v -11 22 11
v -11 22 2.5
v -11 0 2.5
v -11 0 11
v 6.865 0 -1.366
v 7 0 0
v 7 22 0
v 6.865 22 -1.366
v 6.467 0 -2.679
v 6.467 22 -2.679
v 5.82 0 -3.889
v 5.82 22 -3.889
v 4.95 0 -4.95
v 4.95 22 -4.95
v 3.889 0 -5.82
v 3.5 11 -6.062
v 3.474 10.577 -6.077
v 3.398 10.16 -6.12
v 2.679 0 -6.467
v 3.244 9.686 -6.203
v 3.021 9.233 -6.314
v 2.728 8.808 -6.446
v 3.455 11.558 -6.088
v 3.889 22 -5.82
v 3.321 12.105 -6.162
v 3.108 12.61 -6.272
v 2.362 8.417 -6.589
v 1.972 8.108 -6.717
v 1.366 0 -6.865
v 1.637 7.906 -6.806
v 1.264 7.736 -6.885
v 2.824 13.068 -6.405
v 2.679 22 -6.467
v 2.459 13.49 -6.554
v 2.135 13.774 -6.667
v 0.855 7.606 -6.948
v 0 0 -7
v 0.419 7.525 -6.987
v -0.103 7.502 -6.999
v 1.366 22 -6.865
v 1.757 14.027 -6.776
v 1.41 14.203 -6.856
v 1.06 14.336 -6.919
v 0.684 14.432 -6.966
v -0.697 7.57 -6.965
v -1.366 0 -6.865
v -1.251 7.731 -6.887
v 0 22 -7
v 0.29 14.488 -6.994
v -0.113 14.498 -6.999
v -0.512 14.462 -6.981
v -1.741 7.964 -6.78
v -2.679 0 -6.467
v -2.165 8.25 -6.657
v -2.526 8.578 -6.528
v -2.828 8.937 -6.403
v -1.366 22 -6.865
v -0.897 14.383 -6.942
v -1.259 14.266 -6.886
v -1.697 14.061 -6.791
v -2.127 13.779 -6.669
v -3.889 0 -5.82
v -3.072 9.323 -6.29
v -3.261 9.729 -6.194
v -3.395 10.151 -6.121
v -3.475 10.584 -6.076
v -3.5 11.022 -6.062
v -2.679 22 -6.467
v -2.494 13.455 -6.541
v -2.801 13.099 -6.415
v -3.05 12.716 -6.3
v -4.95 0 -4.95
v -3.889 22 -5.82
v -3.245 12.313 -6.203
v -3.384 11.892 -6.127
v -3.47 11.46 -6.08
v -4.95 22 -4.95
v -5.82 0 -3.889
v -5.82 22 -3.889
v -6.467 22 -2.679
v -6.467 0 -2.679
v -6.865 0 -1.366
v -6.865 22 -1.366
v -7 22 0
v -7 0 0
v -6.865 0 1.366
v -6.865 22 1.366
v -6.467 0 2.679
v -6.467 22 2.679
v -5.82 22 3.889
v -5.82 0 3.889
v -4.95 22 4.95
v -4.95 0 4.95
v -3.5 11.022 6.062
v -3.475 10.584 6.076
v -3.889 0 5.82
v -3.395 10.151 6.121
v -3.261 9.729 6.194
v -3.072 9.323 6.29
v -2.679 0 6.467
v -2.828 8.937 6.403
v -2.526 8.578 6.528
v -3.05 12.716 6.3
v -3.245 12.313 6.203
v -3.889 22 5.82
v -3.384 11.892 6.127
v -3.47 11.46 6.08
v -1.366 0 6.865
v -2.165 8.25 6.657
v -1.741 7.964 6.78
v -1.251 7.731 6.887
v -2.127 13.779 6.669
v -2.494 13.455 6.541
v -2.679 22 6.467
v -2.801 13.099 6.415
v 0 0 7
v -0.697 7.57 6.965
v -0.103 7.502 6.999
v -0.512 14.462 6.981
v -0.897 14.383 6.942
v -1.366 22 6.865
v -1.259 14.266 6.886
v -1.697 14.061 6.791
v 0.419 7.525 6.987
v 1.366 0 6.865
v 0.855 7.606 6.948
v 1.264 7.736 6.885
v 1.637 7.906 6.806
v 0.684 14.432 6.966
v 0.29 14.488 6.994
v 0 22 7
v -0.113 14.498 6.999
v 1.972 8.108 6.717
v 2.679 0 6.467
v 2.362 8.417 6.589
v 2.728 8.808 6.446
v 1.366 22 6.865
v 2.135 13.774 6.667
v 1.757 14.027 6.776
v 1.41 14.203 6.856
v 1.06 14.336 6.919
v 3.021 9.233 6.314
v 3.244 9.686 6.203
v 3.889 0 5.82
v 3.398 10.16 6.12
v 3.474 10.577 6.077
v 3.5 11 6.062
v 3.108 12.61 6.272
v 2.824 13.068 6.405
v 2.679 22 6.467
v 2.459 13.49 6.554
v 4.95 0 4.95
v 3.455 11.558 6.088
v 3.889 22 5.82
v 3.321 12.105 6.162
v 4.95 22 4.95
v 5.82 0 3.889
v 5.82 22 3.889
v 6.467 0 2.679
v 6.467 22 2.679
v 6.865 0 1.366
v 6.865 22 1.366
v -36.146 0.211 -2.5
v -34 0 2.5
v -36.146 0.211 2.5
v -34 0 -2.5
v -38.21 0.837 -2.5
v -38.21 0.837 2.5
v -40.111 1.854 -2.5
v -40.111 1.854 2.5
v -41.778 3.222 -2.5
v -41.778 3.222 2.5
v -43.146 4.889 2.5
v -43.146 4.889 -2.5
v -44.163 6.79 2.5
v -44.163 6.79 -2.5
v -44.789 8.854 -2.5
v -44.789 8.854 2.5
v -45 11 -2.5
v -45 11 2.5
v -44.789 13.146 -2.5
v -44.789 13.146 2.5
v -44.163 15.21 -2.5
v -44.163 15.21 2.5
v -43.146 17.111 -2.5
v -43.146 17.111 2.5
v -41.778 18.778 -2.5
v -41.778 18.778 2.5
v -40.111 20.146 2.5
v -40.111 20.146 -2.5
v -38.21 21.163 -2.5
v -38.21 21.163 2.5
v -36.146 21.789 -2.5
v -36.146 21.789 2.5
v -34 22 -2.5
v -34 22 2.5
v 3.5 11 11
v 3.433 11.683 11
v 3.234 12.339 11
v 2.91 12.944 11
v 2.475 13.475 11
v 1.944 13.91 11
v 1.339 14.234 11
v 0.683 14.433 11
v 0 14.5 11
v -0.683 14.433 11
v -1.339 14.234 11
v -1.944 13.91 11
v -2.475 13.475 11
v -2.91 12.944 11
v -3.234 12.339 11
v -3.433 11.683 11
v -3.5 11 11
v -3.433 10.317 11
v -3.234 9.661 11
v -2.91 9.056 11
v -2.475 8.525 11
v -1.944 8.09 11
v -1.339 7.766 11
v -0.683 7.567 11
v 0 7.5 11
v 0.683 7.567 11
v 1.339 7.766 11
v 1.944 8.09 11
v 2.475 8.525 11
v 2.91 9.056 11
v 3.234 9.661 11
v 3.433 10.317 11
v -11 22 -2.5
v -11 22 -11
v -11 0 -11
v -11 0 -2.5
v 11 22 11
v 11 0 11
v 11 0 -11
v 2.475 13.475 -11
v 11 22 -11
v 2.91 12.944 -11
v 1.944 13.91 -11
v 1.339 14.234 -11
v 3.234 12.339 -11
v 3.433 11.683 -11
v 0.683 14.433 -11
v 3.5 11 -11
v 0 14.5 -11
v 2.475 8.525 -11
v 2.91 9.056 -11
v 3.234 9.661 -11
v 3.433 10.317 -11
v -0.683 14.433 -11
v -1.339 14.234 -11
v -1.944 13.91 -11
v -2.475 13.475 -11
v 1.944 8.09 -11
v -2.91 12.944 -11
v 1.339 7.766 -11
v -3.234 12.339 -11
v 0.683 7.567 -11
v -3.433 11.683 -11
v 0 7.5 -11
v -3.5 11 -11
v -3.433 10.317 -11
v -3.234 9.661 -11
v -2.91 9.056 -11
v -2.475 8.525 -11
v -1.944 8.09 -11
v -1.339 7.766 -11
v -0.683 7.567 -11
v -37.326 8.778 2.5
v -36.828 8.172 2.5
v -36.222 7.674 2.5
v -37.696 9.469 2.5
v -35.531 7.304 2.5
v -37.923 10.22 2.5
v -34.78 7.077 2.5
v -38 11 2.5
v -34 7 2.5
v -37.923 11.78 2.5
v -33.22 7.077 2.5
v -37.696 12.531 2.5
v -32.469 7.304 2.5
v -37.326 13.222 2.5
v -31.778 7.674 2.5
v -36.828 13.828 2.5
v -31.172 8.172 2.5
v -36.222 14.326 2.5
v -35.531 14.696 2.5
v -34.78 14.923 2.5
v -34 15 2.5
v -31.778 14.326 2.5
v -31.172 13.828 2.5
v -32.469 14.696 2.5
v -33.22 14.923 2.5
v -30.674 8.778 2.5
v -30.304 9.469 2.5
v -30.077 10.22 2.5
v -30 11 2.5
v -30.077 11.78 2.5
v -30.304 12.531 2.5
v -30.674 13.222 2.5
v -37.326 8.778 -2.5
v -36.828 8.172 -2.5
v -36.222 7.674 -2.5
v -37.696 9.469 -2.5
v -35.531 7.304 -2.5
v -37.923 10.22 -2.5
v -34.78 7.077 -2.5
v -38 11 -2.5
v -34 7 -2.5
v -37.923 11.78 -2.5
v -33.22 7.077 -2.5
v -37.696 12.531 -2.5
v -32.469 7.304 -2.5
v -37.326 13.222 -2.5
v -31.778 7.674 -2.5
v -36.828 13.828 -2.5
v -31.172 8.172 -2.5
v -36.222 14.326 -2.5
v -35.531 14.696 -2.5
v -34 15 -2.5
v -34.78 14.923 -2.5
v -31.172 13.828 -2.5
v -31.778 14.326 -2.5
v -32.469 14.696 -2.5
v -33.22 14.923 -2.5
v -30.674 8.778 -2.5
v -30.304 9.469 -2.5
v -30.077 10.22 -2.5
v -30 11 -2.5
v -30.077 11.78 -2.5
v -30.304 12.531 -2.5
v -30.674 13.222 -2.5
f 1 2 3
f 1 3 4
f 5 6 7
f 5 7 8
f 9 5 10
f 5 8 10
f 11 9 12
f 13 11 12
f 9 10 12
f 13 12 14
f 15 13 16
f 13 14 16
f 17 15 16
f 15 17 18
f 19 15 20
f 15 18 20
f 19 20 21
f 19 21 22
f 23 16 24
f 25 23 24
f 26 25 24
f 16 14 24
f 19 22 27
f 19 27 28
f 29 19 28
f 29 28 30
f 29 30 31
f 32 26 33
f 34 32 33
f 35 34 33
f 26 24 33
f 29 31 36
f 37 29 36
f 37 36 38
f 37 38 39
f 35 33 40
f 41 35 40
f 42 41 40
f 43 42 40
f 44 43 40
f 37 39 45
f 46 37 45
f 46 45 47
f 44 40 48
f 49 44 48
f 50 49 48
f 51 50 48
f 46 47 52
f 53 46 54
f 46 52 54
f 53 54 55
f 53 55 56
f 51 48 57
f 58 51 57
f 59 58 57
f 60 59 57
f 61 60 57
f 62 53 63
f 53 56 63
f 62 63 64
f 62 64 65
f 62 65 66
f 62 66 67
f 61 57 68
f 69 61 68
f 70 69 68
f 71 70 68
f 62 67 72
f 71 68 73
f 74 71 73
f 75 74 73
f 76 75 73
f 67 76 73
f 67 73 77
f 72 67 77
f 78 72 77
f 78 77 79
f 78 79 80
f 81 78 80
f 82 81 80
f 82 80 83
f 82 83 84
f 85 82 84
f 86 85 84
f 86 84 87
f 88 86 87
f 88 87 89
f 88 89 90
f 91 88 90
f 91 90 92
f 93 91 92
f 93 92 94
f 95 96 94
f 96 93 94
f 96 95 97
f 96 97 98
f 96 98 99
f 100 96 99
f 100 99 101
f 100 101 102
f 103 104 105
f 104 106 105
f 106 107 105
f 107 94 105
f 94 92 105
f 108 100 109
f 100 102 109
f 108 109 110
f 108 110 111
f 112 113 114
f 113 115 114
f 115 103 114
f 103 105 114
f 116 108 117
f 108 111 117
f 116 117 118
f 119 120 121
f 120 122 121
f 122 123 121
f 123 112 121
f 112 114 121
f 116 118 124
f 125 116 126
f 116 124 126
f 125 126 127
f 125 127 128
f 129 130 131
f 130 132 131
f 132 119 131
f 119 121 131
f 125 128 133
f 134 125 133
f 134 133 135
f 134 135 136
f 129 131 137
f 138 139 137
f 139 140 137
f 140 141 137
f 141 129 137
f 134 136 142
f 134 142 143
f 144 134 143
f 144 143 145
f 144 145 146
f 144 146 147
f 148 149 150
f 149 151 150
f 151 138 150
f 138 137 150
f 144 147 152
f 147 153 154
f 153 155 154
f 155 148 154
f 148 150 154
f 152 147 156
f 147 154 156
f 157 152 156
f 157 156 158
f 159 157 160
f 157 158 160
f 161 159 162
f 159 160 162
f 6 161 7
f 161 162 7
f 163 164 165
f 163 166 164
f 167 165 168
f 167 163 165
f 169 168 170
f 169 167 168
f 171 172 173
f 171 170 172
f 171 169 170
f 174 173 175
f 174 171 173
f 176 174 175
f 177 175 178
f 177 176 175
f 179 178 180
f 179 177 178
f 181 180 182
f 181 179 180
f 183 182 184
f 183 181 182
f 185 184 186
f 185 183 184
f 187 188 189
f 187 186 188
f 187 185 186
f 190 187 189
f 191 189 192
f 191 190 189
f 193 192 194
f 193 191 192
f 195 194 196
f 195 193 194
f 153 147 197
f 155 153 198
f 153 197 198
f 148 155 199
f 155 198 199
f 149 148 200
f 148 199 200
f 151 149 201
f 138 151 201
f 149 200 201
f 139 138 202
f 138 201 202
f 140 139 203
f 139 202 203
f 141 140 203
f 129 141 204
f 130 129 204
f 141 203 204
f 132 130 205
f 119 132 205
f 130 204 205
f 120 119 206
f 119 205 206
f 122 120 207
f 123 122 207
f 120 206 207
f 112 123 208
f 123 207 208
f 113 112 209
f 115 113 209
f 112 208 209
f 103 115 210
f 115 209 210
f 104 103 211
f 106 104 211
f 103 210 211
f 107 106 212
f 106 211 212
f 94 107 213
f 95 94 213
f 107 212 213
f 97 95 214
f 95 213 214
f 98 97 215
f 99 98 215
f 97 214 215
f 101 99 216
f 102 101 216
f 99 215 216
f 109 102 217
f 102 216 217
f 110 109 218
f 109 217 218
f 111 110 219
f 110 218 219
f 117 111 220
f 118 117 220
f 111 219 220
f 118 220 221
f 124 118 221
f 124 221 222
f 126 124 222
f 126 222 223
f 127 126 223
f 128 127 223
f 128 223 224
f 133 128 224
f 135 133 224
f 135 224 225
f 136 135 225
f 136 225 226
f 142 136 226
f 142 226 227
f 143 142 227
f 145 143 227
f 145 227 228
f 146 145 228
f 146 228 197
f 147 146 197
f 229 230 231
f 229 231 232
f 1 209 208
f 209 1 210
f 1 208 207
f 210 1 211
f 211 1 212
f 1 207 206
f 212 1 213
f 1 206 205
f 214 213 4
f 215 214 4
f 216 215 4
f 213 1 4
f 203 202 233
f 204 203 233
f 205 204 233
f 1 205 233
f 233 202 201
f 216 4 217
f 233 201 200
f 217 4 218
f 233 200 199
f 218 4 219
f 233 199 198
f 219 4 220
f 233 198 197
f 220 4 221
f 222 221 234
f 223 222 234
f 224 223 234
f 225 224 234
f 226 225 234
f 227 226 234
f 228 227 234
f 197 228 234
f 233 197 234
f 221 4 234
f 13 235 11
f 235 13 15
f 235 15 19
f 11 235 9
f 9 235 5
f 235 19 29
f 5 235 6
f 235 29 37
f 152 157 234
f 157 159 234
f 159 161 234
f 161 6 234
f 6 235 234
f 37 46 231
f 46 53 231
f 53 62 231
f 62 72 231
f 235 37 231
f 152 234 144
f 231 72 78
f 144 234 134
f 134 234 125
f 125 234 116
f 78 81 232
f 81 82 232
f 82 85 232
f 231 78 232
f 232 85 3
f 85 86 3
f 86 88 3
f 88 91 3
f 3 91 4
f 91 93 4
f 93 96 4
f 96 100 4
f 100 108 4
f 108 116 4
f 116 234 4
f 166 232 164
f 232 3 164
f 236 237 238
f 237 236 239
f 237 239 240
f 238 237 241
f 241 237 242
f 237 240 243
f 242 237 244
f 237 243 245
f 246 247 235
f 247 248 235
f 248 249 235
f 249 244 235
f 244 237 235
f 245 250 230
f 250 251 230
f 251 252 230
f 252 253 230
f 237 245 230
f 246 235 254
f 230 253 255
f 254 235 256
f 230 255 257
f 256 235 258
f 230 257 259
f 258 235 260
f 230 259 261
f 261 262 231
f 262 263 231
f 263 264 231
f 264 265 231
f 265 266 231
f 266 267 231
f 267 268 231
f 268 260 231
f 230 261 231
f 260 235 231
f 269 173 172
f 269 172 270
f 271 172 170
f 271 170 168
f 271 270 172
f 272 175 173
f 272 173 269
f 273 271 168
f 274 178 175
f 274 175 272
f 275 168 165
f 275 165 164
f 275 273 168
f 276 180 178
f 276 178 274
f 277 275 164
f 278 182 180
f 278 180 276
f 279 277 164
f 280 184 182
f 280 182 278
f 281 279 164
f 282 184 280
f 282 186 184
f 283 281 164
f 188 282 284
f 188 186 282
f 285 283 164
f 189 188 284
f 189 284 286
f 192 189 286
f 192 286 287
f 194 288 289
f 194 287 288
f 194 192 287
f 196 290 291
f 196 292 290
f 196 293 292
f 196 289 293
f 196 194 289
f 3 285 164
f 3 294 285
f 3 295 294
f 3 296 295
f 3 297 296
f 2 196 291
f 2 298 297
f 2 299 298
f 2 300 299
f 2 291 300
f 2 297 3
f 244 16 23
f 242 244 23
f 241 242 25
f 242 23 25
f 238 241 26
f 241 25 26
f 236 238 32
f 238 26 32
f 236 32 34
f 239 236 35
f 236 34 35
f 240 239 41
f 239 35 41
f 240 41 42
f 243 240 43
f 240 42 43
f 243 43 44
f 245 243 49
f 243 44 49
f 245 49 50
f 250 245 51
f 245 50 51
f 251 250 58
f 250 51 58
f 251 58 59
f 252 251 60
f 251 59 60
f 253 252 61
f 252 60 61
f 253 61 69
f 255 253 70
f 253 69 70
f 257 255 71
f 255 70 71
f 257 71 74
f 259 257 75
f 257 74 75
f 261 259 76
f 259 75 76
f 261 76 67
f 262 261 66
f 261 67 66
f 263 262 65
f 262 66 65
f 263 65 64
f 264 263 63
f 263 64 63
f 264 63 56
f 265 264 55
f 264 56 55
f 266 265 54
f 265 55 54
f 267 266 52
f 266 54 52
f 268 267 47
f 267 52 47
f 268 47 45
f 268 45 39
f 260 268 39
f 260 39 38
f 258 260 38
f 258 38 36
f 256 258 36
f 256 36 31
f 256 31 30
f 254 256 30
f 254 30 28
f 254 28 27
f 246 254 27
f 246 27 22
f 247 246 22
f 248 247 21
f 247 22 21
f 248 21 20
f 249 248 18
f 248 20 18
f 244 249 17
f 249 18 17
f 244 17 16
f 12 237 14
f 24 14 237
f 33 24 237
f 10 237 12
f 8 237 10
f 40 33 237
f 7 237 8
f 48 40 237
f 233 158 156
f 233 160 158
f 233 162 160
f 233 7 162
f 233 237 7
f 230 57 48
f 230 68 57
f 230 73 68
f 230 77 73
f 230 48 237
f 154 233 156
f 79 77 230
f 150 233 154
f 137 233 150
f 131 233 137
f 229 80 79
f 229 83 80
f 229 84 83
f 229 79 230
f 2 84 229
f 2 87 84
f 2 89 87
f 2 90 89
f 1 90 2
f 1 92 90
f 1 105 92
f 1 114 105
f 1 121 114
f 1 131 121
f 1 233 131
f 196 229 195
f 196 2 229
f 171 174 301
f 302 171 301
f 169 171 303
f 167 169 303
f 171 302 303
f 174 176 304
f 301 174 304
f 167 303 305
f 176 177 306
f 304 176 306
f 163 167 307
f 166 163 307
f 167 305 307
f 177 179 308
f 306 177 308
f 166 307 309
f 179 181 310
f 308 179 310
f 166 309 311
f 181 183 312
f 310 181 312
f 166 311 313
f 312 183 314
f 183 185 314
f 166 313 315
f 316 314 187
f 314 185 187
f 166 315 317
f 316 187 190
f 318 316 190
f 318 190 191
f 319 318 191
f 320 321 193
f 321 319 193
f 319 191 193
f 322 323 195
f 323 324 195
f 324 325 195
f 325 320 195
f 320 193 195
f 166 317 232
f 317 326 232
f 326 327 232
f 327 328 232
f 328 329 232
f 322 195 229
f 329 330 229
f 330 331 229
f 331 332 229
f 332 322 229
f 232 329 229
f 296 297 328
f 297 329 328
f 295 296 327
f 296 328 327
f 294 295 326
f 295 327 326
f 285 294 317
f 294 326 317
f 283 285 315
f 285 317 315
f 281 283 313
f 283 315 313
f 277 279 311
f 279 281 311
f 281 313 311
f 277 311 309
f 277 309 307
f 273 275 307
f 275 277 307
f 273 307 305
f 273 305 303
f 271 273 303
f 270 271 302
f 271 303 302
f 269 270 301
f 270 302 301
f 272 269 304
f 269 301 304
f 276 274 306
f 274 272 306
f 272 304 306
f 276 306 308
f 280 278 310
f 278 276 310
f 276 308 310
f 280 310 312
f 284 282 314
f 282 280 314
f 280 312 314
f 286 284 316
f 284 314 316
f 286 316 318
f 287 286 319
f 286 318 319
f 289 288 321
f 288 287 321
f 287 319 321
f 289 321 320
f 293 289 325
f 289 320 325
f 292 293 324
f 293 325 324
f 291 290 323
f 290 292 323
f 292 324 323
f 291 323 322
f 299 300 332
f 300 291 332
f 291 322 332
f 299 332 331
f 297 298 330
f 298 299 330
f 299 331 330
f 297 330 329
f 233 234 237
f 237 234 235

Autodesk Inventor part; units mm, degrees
ref_plane "YZ Plane" through (0, 0, 0) normal (1, 0, 0) x (0, 1, 0)
ref_plane "XZ Plane" through (0, 0, 0) normal (0, 1, 0) x (-1, 0, 0)
ref_plane "XY Plane" through (0, 0, 0) normal (0, 0, 1) x (1, 0, 0)
sketch "Boceto1" plane through (0, 0, 0) normal (0, 1, 0) x (-1, 0, 0)
  line L0 (11, 11) -> (-11, 11)
  line L1 (-11, 11) -> (-11, -11)
  line L2 (-11, -11) -> (11, -11)
  line L3 (11, -11) -> (11, 11)
  line L4 (11, -11) -> (-11, 11) construction
  line L5 (-11, -11) -> (11, 11) construction
  circle A0 centre (0, 0) radius 7 construction
  point P0 (0, 0)
  point P1 (0, 0)
  dimension "d0" = 22
  dimension "d1" = 22
  dimension "d2" = 22
  dimension "d3" = 14
extrude "Extrusión1" add sketch "Boceto1" along normal blind 22
sketch "Boceto2" plane through (0, 0, 0) normal (0, 0, 1) x (1, 0, 0)
  line L0 (0, 0) -> (0, 11) construction
  line L1 (0, 11) -> (-34, 11) construction
  circle A0 centre (-34, 11) radius 4
  arc A1 (-34, 22) -> (-34, 0) centre (-34, 11) ccw
  line L2 (-11, 0) -> (11, 0) projected
  line L3 (11, 0) -> (11, 22) projected
  line L4 (-11, 22) -> (11, 22) projected
  line L5 (-11, 0) -> (-11, 22) projected
  line L6 (-34, 0) -> (-11, 0)
  line L7 (-34, 22) -> (-11, 22)
  line L8 (-11, 22) -> (-11, 0)
  dimension "d6" = 11
  dimension "d8" = 34
  dimension "d9" = 8
  dimension "d10" = 22
extrude "Extrusión2" add sketch "Boceto2" along normal mid plane 5 contours L7 L5 L6 A1
sketch "Boceto3" plane through (-11, 0, 11) normal (0, 0, 1) x (1, 0, 0)
  line L0 (0, 0) -> (0, 11) construction
  line L1 (0, 0) -> (0, 22) projected
  line L2 (0, 11) -> (11, 11) construction
  circle A0 centre (11, 11) radius 3.5
  line L3 (0, 0) -> (22, 0) projected
  point P0 (11, 0)
  point P1 (11, 0)
  dimension "d14" = 7
  dimension "d15" = 11
extrude "Extrusión3" cut sketch "Boceto3" against normal through all
sketch "Boceto4" plane through (0, 22, 0) normal (0, 1, 0) x (1, 0, 0)
  circle A0 centre (0, 0) radius 7
  dimension "d18" = 14
extrude "Extrusión4" cut sketch "Boceto4" against normal through all
properties part number "17_UnionA"
